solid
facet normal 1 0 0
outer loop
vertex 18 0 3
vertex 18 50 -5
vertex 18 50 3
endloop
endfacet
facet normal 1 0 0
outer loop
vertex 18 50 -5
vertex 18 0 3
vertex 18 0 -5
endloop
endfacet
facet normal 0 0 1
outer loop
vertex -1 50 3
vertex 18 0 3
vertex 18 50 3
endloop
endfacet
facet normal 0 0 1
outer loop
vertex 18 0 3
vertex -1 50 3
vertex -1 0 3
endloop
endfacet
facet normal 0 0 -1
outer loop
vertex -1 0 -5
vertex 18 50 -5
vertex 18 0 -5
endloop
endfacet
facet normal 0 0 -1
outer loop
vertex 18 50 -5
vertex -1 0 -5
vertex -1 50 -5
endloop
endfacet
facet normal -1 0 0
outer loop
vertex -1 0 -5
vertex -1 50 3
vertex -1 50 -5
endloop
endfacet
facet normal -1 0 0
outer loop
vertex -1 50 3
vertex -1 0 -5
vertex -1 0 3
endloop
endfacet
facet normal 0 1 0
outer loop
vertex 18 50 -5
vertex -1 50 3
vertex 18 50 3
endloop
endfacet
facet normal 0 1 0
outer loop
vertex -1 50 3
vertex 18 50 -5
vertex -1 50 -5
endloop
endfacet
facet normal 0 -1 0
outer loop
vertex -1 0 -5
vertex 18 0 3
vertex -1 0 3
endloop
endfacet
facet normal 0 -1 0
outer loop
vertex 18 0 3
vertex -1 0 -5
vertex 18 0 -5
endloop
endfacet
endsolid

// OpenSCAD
translate([8.5,25,-1]){
cube([19,50,8],true);
}
translate([8.5,25,-1]){
    cube([2.5,2.5,1]);
}
